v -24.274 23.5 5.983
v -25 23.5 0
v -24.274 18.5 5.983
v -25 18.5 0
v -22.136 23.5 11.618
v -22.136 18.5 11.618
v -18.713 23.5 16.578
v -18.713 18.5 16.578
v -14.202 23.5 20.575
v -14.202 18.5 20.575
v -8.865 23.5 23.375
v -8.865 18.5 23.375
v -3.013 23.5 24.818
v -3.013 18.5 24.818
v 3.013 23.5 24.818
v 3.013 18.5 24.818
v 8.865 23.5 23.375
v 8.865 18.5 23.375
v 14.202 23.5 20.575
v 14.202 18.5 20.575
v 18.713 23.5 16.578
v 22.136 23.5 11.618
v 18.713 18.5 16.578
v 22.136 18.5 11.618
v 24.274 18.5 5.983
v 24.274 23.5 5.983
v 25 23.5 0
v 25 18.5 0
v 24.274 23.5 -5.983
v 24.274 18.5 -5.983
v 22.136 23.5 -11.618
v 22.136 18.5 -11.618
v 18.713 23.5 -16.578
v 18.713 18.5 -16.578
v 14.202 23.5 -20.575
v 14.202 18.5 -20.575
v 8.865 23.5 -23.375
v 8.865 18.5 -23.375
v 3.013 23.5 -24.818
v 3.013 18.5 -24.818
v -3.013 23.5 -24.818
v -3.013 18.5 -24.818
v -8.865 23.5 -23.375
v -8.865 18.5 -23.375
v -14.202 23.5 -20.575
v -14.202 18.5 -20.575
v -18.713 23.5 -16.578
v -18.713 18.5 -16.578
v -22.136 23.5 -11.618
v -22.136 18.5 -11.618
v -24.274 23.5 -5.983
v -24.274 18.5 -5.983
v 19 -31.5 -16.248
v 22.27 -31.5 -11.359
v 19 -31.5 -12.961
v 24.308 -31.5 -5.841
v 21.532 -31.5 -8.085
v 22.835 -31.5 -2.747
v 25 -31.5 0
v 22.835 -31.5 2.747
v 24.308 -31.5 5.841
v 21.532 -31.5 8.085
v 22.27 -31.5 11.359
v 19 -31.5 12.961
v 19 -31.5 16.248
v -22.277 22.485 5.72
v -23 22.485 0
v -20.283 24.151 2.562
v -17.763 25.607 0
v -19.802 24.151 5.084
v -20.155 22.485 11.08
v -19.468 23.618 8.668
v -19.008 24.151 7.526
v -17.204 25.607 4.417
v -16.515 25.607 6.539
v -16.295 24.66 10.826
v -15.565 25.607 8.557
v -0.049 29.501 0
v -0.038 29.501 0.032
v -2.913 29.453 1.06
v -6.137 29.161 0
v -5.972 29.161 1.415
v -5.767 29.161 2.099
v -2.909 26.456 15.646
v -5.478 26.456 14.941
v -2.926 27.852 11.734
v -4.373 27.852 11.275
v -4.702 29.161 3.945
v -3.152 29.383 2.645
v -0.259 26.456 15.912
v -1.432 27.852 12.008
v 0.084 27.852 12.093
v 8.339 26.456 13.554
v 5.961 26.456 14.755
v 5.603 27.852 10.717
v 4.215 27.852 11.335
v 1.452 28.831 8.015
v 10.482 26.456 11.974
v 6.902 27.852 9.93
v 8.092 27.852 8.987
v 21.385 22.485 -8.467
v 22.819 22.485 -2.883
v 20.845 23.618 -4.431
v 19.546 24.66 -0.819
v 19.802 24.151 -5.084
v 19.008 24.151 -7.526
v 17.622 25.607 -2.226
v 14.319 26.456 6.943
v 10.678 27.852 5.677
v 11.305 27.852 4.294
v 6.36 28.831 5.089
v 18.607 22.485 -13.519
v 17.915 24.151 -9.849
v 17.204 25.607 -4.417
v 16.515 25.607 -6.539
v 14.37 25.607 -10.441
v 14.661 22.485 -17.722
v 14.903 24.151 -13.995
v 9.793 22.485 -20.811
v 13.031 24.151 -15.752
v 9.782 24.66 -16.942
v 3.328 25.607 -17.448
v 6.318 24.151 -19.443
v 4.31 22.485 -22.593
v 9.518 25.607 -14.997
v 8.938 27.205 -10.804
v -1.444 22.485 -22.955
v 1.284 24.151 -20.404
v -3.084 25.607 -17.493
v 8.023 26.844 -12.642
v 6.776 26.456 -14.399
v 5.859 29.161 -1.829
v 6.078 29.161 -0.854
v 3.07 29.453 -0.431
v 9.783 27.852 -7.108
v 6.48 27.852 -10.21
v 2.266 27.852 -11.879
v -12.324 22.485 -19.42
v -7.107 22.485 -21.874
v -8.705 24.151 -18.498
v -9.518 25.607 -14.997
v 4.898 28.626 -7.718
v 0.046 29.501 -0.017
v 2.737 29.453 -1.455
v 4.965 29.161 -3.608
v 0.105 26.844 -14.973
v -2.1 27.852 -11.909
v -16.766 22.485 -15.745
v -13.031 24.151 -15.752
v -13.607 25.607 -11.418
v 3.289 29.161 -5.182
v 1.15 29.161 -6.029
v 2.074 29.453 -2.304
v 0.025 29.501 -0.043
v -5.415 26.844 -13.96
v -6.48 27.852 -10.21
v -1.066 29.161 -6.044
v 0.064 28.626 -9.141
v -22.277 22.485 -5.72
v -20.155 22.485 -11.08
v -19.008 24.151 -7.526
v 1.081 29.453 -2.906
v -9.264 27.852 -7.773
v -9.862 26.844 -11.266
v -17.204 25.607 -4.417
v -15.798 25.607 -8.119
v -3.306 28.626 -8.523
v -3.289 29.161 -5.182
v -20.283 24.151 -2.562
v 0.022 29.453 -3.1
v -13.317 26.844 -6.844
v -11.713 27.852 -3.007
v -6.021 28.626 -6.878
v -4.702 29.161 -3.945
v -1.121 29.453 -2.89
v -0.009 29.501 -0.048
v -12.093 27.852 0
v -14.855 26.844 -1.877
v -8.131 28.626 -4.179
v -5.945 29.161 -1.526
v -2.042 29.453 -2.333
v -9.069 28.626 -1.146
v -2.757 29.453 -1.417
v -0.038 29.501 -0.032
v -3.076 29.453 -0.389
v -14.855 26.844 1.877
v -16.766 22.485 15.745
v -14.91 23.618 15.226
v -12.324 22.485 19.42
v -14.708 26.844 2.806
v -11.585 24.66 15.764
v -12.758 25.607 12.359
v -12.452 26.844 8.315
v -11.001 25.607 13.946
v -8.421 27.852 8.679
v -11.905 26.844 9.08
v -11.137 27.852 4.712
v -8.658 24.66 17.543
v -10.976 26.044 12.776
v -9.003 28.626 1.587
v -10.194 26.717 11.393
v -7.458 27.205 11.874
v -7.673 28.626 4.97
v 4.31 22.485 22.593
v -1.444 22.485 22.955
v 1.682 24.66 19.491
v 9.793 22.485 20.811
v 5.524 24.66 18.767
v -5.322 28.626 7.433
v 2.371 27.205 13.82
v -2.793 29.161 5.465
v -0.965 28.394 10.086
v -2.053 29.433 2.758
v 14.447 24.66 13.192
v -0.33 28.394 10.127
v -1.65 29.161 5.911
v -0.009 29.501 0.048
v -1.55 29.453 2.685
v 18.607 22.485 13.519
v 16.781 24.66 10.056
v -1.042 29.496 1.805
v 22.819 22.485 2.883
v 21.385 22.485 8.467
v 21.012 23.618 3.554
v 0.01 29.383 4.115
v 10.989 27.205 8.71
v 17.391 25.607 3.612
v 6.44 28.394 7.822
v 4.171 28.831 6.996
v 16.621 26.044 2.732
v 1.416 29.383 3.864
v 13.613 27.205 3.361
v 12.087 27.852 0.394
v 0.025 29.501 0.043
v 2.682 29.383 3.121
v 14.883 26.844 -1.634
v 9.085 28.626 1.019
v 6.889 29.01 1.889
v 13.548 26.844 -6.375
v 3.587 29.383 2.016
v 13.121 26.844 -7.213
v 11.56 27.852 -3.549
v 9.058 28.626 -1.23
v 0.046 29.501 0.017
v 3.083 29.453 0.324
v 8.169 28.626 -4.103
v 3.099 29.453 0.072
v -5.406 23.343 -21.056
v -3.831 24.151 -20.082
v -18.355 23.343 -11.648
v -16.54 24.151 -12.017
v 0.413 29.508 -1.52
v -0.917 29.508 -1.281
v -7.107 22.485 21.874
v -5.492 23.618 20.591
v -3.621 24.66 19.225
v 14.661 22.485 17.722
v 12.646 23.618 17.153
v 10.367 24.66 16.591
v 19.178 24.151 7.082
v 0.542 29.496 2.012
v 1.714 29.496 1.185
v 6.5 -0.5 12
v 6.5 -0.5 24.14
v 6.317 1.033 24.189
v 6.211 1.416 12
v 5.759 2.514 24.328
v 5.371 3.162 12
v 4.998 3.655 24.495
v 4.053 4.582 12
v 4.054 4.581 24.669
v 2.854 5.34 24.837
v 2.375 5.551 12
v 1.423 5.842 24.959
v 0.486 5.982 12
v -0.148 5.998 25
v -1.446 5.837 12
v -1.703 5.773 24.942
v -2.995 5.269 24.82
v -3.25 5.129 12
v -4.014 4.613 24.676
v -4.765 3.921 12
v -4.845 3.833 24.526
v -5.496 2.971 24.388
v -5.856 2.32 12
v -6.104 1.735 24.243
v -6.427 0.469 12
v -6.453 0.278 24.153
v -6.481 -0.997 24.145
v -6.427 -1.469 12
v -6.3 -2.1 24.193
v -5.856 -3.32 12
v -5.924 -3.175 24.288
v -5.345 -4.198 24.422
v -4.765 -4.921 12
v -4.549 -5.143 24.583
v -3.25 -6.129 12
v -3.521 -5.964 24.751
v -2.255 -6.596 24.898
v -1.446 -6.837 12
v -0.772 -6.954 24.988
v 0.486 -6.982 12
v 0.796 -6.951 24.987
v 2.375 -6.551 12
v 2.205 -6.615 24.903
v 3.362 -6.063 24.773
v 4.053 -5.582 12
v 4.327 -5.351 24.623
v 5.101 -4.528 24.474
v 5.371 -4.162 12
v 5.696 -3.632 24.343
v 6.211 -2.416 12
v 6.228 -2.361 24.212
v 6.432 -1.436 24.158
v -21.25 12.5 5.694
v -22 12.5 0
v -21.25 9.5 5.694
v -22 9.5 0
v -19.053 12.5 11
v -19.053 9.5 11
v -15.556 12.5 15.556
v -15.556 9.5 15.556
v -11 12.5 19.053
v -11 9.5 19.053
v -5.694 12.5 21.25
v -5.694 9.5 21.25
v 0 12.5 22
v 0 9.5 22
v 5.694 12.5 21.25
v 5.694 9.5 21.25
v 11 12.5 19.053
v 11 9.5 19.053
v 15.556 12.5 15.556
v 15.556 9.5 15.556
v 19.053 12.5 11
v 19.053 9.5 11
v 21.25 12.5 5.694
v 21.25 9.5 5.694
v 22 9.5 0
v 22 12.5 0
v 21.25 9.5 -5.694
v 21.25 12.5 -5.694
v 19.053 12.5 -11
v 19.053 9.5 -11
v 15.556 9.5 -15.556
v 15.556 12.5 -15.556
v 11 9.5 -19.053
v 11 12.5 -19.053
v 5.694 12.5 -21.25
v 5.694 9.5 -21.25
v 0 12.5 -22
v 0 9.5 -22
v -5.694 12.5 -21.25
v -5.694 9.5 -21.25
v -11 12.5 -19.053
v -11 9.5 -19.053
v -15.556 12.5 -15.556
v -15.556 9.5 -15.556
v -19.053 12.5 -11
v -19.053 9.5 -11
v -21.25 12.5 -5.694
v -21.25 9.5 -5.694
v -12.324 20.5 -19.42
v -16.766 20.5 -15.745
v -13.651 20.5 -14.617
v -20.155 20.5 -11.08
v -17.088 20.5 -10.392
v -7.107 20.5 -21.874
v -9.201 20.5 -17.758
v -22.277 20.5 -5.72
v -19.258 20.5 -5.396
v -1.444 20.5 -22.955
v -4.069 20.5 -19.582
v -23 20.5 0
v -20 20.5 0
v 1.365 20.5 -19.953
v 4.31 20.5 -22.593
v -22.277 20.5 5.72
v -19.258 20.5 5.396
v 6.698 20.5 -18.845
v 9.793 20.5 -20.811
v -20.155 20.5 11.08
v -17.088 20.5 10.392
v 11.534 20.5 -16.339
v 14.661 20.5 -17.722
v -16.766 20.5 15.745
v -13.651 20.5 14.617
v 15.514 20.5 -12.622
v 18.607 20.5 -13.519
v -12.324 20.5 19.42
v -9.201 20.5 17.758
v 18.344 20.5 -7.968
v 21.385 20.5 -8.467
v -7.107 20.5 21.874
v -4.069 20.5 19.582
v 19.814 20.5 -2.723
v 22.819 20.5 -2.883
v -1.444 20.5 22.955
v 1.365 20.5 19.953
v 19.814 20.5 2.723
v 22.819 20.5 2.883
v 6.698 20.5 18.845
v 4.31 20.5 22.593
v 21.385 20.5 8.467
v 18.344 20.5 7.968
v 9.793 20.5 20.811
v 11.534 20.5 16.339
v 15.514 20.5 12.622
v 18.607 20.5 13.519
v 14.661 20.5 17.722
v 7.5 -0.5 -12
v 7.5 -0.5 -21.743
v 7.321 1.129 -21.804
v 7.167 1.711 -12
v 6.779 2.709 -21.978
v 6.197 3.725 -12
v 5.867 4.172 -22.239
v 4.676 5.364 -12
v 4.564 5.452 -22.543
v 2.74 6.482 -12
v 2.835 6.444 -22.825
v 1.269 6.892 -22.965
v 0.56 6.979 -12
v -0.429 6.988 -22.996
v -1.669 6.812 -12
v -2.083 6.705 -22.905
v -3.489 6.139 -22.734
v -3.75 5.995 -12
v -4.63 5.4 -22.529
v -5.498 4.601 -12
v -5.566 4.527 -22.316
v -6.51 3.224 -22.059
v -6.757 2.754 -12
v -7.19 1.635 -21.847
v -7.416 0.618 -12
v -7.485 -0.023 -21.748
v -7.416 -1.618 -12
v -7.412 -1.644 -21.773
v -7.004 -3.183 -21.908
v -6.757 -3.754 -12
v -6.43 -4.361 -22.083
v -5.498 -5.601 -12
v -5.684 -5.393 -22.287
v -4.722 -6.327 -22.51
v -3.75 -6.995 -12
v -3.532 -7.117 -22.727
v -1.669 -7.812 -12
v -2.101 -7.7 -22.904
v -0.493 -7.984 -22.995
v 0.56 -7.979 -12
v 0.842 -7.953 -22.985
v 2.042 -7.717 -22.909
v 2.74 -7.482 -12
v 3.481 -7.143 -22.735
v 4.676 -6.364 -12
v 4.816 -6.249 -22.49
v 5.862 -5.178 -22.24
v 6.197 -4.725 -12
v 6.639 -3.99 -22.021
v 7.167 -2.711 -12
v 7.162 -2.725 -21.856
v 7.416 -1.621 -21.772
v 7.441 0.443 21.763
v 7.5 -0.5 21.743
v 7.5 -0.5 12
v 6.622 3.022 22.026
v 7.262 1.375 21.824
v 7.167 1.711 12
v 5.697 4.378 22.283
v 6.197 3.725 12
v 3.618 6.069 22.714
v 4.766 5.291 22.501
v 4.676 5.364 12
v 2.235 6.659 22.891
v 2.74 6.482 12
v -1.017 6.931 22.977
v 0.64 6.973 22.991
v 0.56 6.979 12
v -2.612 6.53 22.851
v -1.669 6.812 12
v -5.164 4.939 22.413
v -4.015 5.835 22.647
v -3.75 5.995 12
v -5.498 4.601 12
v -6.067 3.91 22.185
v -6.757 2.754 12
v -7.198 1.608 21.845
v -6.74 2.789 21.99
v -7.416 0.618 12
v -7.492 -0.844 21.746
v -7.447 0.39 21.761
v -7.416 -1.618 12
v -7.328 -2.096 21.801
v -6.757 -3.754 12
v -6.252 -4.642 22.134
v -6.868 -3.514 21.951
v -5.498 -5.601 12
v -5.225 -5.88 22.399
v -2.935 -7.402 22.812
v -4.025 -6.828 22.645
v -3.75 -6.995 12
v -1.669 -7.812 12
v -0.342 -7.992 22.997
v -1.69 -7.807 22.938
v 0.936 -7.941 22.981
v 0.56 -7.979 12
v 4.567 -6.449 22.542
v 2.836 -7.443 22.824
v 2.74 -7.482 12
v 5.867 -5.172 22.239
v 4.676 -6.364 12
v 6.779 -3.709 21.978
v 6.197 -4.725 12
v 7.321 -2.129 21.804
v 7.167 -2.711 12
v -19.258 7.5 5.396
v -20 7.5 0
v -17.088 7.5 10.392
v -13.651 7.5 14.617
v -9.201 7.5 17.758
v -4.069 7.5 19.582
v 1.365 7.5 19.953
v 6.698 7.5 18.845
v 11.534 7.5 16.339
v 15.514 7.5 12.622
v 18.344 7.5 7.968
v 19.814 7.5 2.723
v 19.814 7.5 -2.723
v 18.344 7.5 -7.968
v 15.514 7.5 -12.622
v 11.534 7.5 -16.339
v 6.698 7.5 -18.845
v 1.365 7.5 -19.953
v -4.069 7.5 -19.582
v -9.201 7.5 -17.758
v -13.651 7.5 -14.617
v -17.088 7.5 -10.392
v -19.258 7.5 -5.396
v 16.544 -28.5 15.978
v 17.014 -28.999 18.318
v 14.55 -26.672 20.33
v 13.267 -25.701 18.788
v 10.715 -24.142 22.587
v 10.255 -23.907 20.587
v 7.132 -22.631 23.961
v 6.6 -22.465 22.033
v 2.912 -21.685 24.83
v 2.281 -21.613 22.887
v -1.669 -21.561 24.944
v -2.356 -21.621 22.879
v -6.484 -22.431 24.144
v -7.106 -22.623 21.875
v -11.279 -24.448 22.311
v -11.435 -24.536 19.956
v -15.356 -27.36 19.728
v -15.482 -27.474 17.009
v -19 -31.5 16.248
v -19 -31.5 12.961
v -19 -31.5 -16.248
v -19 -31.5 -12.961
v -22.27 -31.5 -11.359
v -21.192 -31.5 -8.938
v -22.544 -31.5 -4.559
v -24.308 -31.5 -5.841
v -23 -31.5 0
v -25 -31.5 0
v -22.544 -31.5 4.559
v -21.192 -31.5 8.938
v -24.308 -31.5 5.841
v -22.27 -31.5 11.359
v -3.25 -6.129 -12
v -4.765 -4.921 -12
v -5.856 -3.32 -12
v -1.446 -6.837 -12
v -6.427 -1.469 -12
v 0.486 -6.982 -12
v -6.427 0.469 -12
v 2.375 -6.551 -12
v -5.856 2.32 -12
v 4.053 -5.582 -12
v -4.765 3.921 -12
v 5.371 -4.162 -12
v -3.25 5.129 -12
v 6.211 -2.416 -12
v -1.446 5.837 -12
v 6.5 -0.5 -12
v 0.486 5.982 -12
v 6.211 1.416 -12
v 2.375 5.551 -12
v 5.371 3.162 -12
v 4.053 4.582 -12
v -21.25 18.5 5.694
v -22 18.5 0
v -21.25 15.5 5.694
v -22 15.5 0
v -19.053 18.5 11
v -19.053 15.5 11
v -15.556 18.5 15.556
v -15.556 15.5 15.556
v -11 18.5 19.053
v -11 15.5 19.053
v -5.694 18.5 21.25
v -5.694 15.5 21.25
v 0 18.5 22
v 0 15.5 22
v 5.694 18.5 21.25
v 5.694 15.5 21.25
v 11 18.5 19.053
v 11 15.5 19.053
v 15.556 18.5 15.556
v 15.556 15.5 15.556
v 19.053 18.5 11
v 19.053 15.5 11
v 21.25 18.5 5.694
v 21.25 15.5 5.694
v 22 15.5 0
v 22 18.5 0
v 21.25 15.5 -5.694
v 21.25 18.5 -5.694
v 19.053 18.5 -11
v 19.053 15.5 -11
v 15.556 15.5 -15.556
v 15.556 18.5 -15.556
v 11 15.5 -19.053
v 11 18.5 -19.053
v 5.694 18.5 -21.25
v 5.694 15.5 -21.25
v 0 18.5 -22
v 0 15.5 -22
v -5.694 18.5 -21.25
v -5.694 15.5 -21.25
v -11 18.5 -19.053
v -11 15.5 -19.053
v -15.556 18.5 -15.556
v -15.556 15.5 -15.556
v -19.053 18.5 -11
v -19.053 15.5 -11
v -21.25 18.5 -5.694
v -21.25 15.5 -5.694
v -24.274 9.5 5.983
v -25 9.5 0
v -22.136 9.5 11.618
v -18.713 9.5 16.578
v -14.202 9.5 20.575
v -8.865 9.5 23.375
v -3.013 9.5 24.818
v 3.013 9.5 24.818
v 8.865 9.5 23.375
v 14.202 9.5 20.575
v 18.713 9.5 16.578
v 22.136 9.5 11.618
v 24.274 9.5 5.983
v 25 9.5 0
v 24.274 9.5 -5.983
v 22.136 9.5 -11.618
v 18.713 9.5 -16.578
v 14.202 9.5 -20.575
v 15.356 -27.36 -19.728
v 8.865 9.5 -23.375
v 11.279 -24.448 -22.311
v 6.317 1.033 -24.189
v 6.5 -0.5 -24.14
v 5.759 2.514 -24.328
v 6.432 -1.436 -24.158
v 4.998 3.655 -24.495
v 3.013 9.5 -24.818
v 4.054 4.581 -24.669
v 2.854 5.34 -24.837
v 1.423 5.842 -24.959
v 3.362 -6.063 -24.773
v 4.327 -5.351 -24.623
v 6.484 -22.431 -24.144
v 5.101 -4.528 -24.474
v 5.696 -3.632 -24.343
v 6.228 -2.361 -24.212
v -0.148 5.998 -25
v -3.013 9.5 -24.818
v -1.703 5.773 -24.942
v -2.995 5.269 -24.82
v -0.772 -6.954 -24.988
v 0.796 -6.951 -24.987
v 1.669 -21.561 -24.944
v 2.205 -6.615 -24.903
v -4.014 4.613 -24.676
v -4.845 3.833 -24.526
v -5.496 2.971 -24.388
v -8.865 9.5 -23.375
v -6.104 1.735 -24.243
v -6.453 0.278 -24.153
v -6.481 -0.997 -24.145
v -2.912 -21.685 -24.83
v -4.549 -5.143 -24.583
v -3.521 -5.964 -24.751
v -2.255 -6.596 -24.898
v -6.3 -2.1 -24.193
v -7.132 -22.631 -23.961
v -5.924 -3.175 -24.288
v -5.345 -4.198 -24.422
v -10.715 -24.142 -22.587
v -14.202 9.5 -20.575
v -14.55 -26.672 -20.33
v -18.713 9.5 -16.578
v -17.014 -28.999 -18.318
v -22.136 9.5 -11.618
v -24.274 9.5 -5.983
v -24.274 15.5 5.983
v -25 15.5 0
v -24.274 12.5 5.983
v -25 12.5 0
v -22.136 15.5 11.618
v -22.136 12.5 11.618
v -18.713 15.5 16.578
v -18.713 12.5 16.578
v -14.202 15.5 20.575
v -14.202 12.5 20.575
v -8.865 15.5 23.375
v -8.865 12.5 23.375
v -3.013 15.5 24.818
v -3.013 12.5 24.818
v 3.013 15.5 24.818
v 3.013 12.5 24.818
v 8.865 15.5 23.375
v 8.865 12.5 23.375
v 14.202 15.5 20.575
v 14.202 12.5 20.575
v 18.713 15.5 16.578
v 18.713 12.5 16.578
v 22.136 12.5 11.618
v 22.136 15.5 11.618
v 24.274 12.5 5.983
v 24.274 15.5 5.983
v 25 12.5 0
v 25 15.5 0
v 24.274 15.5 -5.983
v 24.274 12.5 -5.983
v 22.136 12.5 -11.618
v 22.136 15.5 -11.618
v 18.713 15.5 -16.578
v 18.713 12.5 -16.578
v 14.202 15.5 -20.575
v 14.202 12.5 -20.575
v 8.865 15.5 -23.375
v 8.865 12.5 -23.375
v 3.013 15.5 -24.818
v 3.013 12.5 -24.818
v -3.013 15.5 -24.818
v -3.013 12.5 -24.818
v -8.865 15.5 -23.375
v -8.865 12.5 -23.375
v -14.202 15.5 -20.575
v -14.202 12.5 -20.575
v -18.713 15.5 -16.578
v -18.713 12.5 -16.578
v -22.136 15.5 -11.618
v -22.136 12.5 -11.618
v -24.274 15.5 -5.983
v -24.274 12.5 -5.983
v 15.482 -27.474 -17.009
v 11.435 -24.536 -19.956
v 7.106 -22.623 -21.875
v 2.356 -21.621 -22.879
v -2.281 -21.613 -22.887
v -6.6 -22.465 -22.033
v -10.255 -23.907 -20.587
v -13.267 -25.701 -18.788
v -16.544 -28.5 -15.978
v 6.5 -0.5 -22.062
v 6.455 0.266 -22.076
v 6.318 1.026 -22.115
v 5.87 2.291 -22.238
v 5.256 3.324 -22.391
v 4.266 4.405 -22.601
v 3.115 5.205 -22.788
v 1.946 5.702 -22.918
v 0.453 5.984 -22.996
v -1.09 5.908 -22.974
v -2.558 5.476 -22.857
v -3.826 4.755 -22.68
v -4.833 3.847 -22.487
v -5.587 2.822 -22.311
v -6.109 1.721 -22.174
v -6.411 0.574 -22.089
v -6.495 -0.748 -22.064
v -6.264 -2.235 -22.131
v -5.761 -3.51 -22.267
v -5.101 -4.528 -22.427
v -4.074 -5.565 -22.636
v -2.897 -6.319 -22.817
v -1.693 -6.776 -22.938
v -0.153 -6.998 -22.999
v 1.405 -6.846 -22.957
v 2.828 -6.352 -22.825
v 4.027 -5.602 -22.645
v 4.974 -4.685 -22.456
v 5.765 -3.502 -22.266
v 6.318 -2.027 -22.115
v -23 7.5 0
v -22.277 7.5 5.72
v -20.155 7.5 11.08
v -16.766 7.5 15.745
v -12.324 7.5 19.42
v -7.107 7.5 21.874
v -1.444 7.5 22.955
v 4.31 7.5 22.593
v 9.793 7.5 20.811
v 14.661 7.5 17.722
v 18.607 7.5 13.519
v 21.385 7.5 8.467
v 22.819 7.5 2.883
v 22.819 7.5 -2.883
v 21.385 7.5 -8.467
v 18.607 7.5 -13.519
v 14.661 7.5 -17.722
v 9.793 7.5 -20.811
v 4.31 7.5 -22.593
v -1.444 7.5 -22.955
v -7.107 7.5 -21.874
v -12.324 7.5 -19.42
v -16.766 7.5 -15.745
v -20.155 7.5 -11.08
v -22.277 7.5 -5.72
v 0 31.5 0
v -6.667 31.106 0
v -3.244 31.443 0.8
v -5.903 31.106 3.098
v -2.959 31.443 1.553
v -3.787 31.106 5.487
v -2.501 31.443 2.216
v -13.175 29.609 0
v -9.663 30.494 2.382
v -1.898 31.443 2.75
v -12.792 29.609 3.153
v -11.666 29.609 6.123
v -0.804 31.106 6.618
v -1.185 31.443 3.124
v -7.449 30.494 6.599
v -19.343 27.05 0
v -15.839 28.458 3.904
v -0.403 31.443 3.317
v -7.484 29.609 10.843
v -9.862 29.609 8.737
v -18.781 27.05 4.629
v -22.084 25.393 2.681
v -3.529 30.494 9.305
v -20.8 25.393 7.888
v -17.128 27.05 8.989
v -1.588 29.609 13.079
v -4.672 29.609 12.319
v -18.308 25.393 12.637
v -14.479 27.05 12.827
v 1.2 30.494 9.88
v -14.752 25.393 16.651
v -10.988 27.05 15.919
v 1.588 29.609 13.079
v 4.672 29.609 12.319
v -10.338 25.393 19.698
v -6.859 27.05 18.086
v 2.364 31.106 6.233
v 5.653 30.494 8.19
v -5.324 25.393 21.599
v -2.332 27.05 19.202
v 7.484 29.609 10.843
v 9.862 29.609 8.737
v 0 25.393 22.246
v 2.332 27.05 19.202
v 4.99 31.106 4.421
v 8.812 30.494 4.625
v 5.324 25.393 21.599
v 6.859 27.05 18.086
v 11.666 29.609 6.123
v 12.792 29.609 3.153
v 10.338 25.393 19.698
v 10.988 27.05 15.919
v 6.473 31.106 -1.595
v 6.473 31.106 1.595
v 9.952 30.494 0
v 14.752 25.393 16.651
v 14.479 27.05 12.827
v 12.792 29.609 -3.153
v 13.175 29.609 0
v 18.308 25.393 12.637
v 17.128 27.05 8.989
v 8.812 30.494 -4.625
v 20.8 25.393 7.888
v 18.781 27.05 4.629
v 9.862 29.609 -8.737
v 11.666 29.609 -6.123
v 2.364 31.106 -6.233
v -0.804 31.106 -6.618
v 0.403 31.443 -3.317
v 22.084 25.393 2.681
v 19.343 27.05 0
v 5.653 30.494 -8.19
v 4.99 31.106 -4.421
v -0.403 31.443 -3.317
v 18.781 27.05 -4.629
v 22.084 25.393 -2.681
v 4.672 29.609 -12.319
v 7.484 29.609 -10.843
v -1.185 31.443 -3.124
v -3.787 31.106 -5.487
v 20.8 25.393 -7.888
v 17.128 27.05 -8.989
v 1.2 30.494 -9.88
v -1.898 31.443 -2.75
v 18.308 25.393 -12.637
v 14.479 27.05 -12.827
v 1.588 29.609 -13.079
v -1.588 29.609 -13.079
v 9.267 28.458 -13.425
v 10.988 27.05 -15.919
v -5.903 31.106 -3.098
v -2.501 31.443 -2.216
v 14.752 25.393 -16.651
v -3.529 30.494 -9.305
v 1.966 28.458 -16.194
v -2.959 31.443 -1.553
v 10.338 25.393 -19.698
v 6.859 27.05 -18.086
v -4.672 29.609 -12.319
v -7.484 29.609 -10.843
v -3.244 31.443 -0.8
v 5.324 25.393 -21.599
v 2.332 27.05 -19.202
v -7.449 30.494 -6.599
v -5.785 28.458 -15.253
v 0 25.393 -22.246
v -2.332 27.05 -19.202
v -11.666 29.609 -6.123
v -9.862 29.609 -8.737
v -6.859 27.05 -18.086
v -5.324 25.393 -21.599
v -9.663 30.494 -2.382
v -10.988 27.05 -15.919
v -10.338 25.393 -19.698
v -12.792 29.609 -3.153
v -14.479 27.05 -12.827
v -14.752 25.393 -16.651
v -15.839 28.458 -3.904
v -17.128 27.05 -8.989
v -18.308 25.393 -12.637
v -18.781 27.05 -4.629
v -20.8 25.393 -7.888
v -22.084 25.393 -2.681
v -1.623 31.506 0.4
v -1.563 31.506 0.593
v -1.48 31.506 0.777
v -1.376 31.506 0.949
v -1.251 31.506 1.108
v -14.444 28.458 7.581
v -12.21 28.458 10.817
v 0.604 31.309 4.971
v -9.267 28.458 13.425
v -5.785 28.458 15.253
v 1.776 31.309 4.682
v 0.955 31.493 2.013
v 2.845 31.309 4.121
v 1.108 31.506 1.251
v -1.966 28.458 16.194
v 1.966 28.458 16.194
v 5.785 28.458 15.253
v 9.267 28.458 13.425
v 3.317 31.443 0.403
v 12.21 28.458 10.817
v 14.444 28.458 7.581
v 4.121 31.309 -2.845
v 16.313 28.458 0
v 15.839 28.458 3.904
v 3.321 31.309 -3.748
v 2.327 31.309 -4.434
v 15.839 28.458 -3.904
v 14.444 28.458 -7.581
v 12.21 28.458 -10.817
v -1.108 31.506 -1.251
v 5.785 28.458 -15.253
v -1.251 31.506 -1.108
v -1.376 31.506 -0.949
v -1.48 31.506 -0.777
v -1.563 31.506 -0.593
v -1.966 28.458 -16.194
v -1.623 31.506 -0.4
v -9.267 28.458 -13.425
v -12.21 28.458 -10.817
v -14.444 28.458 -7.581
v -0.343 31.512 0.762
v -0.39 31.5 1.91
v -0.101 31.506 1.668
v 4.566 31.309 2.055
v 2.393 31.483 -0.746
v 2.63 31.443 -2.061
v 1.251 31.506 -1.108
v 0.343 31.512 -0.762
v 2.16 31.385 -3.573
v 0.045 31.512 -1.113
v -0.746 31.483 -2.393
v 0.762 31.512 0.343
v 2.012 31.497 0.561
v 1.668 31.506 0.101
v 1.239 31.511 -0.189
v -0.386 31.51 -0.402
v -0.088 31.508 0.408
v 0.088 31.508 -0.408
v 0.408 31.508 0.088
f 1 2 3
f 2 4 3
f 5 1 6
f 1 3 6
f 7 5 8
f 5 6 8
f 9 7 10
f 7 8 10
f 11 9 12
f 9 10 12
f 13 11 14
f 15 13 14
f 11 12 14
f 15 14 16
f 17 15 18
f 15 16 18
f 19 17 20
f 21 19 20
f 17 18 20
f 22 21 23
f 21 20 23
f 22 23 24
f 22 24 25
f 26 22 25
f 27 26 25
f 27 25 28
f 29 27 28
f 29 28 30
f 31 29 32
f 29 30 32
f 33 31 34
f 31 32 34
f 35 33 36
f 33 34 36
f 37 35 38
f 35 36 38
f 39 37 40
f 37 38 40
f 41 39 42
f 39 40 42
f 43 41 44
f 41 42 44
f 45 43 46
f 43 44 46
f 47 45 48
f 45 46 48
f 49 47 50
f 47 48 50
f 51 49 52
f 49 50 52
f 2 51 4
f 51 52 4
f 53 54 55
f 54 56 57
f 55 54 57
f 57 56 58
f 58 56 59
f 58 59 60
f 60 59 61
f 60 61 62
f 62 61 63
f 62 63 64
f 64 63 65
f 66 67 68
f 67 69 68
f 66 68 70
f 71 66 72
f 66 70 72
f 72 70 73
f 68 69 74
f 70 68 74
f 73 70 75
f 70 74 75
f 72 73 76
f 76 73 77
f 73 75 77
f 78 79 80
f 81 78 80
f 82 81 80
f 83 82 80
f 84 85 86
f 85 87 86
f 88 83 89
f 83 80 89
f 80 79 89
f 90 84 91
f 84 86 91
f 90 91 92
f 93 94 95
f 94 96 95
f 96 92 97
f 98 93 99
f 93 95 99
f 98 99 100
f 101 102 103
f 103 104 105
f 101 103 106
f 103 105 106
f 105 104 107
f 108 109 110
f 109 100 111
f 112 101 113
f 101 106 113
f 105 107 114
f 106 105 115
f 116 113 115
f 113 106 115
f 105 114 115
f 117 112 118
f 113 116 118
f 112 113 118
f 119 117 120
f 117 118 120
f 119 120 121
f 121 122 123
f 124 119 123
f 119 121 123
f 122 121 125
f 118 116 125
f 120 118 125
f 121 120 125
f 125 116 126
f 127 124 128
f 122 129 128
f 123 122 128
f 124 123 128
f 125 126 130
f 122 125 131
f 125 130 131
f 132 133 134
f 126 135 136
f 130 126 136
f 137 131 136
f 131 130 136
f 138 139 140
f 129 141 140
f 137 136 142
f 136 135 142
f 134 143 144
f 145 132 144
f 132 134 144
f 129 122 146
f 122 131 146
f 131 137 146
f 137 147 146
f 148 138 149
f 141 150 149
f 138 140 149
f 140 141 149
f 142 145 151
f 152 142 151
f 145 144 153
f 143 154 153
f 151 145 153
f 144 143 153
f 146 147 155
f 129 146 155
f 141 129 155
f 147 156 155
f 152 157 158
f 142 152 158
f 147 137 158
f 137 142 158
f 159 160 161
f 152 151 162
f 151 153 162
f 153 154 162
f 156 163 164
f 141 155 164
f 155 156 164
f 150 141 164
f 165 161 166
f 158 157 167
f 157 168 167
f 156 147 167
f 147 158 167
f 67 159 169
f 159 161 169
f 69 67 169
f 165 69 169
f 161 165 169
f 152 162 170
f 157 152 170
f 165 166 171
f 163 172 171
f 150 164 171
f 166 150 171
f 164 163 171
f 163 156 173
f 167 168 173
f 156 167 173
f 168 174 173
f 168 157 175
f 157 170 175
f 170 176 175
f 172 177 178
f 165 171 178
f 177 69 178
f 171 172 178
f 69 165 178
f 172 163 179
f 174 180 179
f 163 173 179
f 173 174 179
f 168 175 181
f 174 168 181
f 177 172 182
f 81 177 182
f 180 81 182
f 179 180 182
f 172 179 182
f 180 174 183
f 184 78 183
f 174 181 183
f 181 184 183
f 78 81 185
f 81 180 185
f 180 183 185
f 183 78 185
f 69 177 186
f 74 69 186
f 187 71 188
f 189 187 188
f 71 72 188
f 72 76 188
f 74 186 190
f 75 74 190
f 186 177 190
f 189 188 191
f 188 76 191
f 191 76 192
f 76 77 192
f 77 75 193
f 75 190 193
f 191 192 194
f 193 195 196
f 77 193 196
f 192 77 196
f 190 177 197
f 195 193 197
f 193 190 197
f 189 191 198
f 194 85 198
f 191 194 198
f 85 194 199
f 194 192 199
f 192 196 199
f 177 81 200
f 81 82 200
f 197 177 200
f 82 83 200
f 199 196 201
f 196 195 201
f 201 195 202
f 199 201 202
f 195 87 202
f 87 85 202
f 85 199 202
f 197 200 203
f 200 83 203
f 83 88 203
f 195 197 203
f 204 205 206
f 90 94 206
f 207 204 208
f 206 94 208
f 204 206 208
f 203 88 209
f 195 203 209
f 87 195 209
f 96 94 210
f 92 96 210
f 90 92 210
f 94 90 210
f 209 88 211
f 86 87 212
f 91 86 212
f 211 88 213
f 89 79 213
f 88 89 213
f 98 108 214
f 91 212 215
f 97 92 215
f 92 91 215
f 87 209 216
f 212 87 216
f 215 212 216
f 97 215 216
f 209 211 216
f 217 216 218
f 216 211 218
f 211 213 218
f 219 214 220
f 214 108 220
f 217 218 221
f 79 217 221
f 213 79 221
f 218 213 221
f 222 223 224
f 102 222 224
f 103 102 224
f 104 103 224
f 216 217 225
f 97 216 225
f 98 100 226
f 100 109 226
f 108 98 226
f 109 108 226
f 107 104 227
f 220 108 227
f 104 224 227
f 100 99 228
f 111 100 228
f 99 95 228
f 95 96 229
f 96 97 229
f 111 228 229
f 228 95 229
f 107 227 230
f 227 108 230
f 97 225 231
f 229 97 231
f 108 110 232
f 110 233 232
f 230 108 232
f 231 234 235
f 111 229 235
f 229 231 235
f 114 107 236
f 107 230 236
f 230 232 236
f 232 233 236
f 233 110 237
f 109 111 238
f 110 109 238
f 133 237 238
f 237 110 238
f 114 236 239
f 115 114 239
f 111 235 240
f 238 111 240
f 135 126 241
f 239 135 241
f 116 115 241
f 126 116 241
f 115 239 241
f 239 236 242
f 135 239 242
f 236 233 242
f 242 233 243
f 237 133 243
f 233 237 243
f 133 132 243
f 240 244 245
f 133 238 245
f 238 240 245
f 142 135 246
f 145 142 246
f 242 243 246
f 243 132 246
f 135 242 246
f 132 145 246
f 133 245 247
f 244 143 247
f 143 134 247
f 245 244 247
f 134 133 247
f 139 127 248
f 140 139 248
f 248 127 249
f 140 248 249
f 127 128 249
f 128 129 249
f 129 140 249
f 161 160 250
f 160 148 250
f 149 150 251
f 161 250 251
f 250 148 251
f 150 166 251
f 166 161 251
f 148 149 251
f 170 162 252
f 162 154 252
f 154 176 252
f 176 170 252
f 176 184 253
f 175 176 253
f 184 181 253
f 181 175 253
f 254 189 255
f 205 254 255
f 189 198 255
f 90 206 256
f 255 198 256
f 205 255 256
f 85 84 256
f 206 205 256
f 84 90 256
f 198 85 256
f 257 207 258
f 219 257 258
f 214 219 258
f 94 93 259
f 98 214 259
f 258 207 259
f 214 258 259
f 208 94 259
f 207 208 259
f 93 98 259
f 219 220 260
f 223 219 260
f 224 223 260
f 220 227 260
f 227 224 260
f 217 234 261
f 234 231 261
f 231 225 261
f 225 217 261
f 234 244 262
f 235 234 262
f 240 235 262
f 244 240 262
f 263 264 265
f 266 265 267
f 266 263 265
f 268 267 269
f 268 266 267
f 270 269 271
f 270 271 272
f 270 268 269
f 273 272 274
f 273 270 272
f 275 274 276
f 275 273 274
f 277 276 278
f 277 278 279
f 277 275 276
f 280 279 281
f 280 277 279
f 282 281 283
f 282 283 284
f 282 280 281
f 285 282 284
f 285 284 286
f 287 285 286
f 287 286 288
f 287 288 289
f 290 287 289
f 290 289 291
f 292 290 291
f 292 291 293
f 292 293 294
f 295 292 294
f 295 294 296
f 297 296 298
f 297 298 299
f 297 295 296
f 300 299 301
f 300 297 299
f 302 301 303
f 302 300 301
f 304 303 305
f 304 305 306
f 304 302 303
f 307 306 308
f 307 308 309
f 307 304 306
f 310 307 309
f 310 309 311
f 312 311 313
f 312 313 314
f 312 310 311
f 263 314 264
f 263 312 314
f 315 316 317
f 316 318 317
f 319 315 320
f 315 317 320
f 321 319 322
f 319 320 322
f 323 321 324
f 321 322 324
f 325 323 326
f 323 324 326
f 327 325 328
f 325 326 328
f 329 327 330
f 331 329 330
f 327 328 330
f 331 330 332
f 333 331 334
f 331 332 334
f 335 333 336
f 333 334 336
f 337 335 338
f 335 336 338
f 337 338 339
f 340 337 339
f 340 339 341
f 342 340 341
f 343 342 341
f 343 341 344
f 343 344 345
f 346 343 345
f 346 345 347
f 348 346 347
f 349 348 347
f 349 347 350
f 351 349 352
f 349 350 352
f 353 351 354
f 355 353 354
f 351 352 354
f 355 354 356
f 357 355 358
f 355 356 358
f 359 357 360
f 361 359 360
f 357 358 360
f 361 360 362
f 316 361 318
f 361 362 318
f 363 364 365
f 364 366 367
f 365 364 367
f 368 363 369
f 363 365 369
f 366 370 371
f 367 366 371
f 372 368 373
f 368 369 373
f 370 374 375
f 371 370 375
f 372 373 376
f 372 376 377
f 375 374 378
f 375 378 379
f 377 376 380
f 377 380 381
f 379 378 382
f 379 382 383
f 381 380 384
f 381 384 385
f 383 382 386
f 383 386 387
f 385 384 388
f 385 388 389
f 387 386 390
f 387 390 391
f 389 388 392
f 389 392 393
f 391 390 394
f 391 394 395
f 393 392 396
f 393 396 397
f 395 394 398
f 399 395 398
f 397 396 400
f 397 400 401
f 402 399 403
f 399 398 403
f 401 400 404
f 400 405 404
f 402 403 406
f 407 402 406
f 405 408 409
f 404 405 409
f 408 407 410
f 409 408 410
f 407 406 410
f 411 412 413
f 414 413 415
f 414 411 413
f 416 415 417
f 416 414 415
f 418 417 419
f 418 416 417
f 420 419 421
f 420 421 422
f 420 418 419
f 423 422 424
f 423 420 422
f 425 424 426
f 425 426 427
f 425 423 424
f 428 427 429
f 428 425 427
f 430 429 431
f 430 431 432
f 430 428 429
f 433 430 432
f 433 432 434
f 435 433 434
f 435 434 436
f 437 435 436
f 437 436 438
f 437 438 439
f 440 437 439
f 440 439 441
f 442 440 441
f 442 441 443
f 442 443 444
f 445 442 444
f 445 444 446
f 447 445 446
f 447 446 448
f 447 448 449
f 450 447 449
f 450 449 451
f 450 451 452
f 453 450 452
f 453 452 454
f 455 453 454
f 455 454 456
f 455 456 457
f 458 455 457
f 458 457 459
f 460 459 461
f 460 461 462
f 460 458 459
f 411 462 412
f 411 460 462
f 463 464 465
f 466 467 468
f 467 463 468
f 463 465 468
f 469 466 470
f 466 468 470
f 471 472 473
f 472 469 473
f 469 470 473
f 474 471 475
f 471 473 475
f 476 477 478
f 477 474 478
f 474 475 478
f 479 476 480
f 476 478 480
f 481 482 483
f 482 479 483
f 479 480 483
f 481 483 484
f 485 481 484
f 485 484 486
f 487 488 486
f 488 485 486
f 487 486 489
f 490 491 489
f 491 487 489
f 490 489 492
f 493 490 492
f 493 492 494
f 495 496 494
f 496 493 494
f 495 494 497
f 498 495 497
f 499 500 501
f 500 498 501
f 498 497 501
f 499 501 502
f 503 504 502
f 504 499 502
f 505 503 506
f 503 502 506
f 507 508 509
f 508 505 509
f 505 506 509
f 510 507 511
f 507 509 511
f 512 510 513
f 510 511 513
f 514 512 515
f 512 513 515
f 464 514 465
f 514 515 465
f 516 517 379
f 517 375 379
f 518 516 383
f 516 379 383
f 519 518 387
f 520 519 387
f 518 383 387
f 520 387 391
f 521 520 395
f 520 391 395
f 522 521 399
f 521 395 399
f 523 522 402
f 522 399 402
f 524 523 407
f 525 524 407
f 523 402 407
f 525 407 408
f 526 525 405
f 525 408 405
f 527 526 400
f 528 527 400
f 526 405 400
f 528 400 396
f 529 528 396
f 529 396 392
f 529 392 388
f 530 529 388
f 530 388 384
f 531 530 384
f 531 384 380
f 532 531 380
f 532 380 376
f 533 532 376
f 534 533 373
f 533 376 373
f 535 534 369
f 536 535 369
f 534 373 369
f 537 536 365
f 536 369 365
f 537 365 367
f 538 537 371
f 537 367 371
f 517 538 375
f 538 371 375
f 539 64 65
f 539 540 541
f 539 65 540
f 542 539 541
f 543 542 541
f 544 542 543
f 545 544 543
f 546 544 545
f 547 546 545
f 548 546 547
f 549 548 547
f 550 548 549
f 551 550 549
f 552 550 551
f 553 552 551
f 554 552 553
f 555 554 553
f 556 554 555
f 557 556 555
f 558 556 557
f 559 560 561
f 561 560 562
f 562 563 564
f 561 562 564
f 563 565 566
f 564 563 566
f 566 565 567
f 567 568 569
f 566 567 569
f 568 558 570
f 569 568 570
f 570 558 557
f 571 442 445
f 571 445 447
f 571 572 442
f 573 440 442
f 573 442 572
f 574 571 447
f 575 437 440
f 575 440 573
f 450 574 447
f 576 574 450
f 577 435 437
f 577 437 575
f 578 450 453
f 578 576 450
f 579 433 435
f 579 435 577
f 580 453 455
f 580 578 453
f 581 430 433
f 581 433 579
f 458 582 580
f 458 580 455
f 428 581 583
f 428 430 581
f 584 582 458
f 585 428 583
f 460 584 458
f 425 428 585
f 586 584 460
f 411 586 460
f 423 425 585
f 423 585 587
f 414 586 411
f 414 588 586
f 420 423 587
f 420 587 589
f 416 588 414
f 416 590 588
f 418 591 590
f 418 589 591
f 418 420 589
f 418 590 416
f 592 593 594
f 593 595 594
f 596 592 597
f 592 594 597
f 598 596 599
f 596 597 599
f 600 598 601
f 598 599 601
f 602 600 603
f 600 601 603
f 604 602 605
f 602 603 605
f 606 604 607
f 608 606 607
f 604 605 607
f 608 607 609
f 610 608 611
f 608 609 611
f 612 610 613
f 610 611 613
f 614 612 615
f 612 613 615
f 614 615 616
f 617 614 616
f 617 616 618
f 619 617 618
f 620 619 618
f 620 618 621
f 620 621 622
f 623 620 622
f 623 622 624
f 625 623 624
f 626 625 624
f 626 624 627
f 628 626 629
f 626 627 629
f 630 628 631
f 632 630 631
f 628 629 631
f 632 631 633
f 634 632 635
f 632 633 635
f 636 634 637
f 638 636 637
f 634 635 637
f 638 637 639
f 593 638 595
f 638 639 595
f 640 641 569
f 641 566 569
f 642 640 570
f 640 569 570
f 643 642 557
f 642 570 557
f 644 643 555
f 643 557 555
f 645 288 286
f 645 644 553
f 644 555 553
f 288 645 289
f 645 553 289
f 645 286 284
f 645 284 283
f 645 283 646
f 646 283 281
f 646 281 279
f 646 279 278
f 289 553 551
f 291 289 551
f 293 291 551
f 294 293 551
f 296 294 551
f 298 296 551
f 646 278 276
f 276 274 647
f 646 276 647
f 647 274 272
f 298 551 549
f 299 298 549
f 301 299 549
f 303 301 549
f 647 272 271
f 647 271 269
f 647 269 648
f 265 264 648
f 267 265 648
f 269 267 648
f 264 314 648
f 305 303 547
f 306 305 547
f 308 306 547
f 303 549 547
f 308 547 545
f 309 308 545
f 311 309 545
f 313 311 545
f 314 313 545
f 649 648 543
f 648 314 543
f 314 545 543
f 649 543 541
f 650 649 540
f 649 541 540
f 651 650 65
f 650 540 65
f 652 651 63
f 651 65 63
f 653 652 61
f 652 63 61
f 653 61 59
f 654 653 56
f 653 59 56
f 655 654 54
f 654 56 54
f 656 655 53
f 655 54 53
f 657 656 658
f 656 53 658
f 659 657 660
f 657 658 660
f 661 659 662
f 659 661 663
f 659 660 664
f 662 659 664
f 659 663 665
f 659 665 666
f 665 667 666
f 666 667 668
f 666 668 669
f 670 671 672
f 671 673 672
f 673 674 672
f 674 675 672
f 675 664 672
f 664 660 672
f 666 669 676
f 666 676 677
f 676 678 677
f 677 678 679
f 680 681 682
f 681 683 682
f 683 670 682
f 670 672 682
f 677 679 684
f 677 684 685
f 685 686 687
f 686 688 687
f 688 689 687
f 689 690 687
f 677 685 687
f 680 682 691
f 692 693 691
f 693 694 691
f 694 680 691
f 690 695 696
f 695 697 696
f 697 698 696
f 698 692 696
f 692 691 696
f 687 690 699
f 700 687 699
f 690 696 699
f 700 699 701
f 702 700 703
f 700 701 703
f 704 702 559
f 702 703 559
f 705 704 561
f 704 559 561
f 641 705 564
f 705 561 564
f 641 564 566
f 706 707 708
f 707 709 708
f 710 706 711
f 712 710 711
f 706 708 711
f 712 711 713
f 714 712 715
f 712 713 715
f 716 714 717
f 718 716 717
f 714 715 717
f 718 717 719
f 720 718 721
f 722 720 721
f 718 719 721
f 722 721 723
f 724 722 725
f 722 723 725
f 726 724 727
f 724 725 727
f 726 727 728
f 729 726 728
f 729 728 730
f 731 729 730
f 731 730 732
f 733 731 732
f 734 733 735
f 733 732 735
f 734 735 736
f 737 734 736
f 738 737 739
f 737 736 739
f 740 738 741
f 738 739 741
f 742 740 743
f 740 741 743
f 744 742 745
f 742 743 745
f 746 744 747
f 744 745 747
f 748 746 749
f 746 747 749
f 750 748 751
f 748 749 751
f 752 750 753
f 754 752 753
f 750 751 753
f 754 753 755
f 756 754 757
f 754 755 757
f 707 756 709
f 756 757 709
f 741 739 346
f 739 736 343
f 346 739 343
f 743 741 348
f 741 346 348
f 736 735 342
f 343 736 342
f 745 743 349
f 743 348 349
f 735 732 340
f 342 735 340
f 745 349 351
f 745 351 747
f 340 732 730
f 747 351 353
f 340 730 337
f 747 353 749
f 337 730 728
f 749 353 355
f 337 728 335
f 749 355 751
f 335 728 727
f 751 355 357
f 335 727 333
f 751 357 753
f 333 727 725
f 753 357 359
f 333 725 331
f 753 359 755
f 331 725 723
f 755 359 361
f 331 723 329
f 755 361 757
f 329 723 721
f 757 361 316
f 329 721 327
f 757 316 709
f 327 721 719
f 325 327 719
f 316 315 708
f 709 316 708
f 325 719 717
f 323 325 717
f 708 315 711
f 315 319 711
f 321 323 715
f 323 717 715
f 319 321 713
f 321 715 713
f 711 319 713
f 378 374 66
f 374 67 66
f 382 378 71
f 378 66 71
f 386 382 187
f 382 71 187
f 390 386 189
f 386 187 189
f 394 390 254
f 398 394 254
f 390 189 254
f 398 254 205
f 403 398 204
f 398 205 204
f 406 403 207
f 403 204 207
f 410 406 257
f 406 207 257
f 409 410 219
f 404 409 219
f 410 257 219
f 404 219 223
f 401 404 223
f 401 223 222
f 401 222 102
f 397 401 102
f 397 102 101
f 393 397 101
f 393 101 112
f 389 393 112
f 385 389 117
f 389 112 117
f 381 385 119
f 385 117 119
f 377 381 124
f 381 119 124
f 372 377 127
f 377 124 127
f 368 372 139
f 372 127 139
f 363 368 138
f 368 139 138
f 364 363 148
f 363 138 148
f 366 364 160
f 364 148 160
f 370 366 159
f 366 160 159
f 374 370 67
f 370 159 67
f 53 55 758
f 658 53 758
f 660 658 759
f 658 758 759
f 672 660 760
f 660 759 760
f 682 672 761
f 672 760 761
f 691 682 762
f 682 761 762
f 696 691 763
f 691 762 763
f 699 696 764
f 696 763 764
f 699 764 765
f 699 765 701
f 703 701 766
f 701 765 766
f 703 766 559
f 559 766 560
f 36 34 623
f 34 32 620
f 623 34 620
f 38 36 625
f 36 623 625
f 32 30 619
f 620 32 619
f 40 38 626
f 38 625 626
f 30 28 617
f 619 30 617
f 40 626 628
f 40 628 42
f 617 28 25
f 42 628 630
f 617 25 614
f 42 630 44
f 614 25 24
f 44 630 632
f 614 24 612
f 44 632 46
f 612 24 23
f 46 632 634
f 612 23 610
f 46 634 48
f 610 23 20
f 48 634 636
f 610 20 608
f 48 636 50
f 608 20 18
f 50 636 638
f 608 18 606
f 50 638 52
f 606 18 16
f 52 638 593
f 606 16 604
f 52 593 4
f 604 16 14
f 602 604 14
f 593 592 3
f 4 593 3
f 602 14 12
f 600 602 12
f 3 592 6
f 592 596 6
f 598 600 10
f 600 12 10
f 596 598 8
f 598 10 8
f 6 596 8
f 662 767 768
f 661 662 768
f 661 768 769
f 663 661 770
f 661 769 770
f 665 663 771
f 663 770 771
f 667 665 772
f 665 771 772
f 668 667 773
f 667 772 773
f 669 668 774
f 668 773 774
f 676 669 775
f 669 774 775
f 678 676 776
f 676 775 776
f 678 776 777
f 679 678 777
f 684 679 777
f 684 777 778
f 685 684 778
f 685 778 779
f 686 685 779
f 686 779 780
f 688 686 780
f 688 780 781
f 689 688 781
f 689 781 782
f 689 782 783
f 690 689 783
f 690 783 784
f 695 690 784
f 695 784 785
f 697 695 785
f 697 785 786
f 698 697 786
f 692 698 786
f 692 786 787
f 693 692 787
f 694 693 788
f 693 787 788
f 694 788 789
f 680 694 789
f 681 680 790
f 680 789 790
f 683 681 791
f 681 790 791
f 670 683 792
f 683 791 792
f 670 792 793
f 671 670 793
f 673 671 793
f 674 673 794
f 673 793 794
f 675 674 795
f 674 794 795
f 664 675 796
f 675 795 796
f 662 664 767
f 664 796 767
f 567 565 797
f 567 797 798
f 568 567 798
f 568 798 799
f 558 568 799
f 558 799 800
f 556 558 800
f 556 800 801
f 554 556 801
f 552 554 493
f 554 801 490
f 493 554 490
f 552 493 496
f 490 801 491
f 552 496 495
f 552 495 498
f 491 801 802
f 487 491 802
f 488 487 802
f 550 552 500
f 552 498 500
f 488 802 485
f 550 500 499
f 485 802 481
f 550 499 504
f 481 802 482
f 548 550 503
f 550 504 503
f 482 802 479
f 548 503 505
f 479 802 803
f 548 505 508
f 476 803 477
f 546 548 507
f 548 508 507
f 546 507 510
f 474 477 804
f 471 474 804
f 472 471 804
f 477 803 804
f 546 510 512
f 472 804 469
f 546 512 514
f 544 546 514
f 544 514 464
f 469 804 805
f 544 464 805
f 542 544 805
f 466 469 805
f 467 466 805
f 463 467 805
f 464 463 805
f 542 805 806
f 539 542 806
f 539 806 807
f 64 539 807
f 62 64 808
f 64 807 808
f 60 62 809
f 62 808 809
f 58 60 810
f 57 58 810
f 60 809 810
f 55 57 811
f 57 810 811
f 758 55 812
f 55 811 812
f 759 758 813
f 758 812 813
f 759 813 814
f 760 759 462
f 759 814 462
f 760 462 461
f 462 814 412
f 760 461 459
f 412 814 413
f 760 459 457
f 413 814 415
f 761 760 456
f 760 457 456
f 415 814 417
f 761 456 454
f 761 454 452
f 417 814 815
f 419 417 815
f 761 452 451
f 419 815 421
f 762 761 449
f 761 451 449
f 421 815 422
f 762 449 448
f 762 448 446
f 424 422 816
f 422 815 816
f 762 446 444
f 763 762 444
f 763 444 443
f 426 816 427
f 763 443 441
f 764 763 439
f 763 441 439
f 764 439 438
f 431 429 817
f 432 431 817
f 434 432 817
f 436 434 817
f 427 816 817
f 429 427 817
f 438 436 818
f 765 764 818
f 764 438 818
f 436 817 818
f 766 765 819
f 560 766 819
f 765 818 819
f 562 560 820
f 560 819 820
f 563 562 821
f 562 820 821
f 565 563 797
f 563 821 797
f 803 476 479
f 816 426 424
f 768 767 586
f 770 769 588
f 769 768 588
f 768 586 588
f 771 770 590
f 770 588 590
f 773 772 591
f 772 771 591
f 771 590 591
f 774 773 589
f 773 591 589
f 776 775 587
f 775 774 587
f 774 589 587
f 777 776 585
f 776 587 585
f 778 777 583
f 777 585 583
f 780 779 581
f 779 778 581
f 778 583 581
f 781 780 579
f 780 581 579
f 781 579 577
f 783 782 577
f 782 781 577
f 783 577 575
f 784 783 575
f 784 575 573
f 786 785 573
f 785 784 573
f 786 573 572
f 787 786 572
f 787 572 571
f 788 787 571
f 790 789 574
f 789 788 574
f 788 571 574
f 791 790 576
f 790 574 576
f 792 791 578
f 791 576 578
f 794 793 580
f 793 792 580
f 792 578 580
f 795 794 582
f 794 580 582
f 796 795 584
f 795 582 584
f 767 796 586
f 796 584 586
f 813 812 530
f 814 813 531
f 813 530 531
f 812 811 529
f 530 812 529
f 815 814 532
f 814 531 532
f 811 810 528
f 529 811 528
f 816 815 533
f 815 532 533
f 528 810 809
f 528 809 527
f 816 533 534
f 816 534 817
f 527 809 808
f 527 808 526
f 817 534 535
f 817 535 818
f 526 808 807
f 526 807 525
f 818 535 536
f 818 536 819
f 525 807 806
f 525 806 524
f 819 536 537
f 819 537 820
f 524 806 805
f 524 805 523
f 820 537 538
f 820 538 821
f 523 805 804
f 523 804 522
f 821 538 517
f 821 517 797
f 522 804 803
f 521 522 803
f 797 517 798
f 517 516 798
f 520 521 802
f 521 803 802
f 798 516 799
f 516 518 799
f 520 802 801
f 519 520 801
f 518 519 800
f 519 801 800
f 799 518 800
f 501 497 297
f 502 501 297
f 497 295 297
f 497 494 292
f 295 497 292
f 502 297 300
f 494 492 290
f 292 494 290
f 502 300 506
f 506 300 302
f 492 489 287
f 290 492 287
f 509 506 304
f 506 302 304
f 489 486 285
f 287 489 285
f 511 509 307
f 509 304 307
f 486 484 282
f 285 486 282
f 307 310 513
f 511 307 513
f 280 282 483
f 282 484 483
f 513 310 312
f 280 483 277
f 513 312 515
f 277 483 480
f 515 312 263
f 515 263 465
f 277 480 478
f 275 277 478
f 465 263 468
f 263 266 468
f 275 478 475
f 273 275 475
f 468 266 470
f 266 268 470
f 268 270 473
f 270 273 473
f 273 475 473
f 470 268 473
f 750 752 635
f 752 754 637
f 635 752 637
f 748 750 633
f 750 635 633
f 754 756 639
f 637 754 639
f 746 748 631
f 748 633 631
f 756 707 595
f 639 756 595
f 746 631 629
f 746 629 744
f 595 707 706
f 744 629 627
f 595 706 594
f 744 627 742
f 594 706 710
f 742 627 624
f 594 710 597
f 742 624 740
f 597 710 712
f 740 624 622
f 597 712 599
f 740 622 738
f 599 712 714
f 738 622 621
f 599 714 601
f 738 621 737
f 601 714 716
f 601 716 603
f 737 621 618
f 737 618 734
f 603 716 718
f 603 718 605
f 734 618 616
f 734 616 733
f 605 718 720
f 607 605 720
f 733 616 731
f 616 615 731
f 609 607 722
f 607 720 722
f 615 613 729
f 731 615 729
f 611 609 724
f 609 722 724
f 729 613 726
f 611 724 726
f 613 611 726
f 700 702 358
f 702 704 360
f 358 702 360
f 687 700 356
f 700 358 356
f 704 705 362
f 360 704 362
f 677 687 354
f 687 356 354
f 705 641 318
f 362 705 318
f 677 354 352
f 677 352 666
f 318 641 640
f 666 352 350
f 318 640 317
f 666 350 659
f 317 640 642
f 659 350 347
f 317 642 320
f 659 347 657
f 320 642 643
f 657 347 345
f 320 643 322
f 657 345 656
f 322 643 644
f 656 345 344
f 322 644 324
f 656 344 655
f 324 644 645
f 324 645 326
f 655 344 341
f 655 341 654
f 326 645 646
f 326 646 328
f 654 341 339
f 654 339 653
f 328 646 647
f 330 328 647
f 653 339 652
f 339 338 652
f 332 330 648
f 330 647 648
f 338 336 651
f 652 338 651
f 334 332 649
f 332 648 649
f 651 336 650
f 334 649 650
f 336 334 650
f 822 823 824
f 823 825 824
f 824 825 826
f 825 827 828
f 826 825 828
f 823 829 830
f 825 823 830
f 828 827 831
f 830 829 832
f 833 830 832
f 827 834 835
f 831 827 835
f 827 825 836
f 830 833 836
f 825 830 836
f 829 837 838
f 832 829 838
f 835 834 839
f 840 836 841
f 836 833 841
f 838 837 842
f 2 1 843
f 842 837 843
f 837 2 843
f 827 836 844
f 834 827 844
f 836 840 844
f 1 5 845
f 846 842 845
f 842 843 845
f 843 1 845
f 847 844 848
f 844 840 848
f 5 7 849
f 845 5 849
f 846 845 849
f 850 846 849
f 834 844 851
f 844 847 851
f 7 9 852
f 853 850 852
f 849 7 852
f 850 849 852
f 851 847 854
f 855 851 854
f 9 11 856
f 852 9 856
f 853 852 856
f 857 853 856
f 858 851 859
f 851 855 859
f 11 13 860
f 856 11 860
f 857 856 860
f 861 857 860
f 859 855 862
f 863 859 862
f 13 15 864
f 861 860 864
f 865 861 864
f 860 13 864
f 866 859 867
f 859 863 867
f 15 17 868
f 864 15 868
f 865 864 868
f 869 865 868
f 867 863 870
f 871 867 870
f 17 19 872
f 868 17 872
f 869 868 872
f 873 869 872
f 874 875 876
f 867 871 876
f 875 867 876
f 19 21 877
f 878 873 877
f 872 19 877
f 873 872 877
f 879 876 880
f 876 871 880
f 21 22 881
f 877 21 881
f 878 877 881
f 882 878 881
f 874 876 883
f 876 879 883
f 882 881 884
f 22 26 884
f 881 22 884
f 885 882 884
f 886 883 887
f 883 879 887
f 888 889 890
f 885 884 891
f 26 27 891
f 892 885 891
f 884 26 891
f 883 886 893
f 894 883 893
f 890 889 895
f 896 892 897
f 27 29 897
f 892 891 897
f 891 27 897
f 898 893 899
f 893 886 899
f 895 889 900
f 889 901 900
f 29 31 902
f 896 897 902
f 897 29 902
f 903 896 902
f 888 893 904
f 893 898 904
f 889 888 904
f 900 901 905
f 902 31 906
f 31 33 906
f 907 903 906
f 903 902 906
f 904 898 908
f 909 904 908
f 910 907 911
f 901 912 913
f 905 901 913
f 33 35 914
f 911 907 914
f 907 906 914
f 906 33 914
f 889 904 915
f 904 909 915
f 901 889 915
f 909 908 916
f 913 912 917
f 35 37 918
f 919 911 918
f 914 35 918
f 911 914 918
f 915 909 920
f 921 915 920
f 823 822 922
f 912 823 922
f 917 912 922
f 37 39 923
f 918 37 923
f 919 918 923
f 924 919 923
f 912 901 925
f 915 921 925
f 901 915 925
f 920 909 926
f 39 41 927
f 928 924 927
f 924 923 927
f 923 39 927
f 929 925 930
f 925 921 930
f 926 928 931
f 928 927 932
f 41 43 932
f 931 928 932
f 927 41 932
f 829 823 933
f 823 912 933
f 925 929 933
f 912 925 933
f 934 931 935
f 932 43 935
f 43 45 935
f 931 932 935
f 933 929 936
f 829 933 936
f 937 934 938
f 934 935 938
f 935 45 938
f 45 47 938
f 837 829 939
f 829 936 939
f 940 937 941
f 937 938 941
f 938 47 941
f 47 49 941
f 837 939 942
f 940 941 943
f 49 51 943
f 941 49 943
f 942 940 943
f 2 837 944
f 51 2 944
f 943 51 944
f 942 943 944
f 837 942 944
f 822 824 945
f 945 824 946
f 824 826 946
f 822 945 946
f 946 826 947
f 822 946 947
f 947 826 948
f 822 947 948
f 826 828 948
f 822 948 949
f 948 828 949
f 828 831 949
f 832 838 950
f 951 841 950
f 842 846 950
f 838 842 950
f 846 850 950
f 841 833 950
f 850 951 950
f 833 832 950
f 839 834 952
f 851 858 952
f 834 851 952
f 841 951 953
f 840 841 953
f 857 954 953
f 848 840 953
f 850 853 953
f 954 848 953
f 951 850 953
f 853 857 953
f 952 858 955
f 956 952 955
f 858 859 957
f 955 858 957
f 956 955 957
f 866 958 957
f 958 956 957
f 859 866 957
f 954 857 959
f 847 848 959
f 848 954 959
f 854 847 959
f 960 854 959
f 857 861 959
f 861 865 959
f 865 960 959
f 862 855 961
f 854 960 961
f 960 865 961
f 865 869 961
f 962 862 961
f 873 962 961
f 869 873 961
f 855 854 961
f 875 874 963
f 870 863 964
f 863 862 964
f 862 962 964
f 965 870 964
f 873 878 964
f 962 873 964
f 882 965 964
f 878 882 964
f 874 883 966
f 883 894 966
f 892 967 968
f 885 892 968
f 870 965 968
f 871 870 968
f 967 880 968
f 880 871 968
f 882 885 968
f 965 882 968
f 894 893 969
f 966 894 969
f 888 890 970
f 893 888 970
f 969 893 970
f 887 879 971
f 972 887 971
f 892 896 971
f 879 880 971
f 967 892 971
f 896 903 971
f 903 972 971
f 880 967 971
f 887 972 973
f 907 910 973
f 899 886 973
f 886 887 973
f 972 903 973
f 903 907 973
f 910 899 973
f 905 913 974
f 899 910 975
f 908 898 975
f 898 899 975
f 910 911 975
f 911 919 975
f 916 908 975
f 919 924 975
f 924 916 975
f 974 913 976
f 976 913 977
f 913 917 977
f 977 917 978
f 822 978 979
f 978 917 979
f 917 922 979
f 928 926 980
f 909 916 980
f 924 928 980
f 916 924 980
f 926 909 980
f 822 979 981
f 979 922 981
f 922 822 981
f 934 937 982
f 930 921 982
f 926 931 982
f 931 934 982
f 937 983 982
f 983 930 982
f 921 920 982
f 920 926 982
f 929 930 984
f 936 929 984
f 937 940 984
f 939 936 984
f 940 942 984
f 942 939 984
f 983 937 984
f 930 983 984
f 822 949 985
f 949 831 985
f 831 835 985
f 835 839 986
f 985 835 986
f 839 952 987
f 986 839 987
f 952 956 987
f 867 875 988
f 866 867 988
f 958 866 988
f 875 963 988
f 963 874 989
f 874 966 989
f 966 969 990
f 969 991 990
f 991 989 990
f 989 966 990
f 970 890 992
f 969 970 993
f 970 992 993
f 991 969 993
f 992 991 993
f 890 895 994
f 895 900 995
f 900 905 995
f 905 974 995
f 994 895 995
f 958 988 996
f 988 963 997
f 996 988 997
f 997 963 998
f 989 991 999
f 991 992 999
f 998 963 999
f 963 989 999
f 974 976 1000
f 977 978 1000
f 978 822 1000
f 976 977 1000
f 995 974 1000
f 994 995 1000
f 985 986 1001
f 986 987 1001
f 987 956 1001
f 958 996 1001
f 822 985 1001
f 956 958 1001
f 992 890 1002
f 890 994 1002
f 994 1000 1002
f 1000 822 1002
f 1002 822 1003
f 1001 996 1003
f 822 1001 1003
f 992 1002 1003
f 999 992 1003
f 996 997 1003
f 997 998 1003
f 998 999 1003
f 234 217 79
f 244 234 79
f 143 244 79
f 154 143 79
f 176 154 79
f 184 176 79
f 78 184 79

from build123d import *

# Parameters (mm, degrees)
SKETCH2_R               = 6.5
CUT_EXTRUDE2_DEPTH      = 26.0000001
CUT_EXTRUDE2_DEPTH_BACK = 26.0000001
BOSS_EXTRUDE1_START     = 12
SKETCH3_R               = 7.5
SKETCH3_R_2             = 6.5
BOSS_EXTRUDE1_DEPTH     = 11


with BuildPart() as part:
    # Sketch1 → Revolve9 (revolve)
    with BuildSketch(Plane.XY):
        with BuildLine():
            Line((-23, -31.5), (-23, 7.5))
            Line((-23, 7.5), (-20, 7.5))
            Line((-20, 7.5), (-20, 20.5))
            Line((-20, 20.5), (-23, 20.5))
            Line((-23, 20.5), (-23, 22.484511145))
            ThreePointArc((-23, 22.484511145), (-12.093024708, 27.851979987), (-0.04919363, 29.500605095))
            Line((-0.04919363, 29.500605095), (0, 29.500605095))
            Line((0, 29.500605095), (0, 31.5))
            ThreePointArc((0, 31.5), (-13.174901691, 29.609067785), (-25, 23.5))
            Line((-25, 23.5), (-25, 18.5))
            Line((-25, 18.5), (-22, 18.5))
            Line((-22, 18.5), (-22, 15.5))
            Line((-22, 15.5), (-25, 15.5))
            Line((-25, 15.5), (-25, 12.5))
            Line((-25, 12.5), (-22, 12.5))
            Line((-22, 12.5), (-22, 9.5))
            Line((-22, 9.5), (-25, 9.5))
            Line((-25, 9.5), (-25, -31.5))
            Line((-25, -31.5), (-23, -31.5))
        make_face()
    revolve(axis=Axis((0, -31.5, 0), (0, 1, 0)))

    # Sketch2 → Cut-Extrude2 (cut, two sides)
    with BuildSketch(Plane.XY) as cut_extrude2_sk:
        with Locations((0, -0.5)):
            Circle(SKETCH2_R)
        with BuildLine():
            Line((-19, -31.5), (19, -31.5))
            ThreePointArc((19, -31.5), (0, -21.5), (-19, -31.5))
        make_face()
    extrude(amount=CUT_EXTRUDE2_DEPTH, mode=Mode.SUBTRACT)
    extrude(cut_extrude2_sk.sketch, amount=-CUT_EXTRUDE2_DEPTH_BACK, mode=Mode.SUBTRACT)

    # Sketch3 → Boss-Extrude1 (add)
    with BuildSketch(Plane.XY.offset(BOSS_EXTRUDE1_START)):
        with Locations((0, -0.5)):
            Circle(SKETCH3_R)
        with Locations((0, -0.5)):
            Circle(SKETCH3_R_2, mode=Mode.SUBTRACT)
    boss_extrude1 = extrude(amount=BOSS_EXTRUDE1_DEPTH)

    # Mirror1: Boss-Extrude1 across plane
    add(boss_extrude1.mirror(Plane.XY))


solid = part.part
